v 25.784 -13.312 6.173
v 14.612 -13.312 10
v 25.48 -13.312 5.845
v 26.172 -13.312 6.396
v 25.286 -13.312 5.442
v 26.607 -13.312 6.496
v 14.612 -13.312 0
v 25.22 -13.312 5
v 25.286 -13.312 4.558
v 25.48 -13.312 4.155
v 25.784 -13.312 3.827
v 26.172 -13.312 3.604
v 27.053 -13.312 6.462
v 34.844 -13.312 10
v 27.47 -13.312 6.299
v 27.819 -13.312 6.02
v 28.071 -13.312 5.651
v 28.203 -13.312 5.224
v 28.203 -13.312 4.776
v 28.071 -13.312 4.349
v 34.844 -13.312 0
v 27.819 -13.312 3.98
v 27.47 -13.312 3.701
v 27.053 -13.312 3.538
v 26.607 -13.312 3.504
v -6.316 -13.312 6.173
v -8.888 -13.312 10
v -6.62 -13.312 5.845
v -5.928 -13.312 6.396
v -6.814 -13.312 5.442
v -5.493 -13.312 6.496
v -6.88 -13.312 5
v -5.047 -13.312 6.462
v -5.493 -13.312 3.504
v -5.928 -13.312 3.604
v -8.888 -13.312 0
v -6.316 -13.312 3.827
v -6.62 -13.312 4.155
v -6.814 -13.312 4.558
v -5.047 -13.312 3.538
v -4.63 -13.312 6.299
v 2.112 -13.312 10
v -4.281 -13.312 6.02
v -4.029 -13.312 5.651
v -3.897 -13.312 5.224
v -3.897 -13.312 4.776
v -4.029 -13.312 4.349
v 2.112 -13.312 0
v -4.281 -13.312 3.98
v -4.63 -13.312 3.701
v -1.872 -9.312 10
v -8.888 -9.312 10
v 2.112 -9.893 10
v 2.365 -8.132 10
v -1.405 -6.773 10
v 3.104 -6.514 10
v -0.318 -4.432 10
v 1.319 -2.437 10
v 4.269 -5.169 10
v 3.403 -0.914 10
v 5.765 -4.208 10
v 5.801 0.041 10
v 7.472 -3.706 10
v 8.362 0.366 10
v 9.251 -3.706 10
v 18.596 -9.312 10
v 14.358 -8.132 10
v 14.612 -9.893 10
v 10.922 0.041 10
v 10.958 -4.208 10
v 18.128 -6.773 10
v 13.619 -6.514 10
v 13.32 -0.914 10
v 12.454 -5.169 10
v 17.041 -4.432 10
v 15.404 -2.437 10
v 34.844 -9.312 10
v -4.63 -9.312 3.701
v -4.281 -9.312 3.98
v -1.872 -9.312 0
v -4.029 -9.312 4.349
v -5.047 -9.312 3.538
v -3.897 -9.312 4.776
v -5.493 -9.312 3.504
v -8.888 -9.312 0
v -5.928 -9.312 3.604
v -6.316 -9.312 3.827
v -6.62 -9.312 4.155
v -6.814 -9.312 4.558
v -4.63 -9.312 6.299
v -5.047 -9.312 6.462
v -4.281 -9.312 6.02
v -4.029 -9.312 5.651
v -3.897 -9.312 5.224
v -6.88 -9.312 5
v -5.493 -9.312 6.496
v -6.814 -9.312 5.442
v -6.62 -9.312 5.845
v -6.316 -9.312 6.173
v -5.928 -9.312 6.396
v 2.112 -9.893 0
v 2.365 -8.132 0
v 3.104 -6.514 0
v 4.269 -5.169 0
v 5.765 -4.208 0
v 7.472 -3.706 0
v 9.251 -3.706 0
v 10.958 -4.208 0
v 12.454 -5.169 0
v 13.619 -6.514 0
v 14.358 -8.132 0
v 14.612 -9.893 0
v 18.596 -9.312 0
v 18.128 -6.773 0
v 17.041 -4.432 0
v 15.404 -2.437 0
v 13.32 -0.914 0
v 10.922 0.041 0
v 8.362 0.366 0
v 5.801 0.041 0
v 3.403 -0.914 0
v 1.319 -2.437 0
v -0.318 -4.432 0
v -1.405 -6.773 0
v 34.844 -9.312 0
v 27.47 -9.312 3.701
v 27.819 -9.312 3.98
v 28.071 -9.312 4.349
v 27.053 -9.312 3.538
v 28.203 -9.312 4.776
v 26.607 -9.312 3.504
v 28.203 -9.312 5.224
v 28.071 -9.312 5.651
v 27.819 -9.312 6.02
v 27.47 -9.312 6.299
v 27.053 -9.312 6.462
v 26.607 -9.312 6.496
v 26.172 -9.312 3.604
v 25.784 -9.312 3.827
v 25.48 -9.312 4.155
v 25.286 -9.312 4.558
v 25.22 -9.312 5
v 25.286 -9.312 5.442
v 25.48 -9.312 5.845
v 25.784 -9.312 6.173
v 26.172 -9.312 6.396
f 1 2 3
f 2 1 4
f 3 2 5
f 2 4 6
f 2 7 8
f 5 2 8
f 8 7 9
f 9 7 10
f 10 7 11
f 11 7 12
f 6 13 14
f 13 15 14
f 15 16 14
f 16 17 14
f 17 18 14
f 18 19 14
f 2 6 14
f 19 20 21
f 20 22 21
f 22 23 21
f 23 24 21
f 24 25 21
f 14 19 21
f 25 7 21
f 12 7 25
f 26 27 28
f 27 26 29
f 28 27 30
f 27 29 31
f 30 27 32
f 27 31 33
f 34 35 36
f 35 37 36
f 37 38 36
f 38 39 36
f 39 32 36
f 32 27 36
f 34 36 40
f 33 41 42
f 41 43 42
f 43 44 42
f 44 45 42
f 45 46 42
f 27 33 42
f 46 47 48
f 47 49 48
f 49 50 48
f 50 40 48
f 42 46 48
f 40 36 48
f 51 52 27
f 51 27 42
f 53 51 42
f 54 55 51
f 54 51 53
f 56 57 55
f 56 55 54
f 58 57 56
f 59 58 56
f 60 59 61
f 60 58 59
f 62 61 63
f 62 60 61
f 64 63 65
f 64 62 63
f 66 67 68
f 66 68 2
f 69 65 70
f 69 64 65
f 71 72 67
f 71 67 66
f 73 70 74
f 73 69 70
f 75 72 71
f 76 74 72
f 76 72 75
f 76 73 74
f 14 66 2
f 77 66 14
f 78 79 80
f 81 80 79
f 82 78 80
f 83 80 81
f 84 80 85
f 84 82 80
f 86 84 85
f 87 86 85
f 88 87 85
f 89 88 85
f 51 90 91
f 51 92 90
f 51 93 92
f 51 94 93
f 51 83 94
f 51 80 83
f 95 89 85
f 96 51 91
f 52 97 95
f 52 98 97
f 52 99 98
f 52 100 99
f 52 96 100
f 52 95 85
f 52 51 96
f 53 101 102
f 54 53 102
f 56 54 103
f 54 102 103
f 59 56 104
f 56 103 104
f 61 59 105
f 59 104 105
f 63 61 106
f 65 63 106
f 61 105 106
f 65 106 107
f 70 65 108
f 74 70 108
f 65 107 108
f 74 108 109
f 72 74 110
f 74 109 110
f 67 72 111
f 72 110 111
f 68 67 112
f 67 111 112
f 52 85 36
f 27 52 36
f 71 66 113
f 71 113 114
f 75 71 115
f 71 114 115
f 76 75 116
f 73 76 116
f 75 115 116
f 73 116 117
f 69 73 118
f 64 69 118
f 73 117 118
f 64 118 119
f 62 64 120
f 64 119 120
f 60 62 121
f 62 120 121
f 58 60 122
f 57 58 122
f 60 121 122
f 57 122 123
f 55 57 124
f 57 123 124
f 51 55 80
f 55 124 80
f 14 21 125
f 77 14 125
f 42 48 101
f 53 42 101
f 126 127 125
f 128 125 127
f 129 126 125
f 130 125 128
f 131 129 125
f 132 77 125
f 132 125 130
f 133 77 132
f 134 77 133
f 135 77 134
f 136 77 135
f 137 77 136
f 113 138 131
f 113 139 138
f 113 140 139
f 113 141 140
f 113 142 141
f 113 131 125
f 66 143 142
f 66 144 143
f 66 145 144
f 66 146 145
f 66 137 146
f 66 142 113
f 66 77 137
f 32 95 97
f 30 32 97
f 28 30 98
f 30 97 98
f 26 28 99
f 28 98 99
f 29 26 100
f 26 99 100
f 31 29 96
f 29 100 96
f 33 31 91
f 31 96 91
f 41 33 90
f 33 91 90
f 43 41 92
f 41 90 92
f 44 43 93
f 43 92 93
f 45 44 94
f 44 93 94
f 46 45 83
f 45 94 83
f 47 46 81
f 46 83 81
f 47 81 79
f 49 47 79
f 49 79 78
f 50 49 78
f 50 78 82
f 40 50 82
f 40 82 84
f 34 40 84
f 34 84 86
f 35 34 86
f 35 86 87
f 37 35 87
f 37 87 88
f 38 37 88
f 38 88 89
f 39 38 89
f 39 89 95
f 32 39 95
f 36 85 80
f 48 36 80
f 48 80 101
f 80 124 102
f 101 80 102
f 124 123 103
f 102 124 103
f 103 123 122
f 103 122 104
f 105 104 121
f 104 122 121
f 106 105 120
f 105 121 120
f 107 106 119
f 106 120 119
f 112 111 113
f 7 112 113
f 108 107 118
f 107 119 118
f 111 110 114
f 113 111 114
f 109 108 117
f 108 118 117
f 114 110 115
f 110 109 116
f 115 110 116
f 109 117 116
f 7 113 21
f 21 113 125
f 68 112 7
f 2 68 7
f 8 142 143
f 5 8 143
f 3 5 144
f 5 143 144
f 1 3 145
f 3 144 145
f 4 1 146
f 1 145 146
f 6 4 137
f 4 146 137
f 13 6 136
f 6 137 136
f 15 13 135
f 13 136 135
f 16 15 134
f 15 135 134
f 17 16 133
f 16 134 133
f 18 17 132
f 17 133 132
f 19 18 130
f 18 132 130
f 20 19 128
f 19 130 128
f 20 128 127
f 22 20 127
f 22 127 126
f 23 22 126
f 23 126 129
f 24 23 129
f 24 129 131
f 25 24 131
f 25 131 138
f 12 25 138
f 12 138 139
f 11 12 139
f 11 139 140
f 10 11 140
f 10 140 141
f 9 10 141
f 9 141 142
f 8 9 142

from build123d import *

# Parameters (mm, degrees)
F1_DEPTH  = 10
F3_DEPTH  = 13.6785106988
F4_DEPTH  = 3.268
F6_DEPTH  = 4
F8_DEPTH  = 4
F9_R      = 1.5
F10_DEPTH = 4.001


# Not quite as in the source:
# - a feature names something its author has since deleted; it is built from what else it names


with BuildPart() as f1:
    # F0 (on Top) → F1 (new body)
    with BuildSketch(Plane.XY):
        with BuildLine():
            Line((14.6115271971, -9.8928403326), (14.6115271971, -13.3118403326))
            Line((14.6115271971, -13.3118403326), (38.1115271971, -13.3118403326))
            Line((38.1115271971, -13.3118403326), (38.1115271971, -9.3118403326))
            Line((38.1115271971, -9.3118403326), (18.5955271971, -9.3118403326))
            ThreePointArc((18.5955271971, -9.3118403326), (8.3615271971, 0.3656703662), (-1.8724728029, -9.3118403326))
            Line((-1.8724728029, -9.3118403326), (-8.8884728029, -9.3118403326))
            Line((-8.8884728029, -9.3118403326), (-8.8884728029, -13.3118403326))
            Line((-8.8884728029, -13.3118403326), (2.1115271971, -13.3118403326))
            Line((2.1115271971, -13.3118403326), (2.1115271971, -9.8928403326))
            ThreePointArc((2.1115271971, -9.8928403326), (8.3615271971, -3.6428403326), (14.6115271971, -9.8928403326))
        make_face()
    extrude(amount=F1_DEPTH)

    # F2 (on face) → F3 (cut, through all)
    with BuildSketch(Plane.XZ.offset(13.3118403326)):
        Polygon((-2.1564728029, 5), (-3.0224728029, 6.4999559994), (-4.7544728029, 6.4999559994), (-5.6204728029, 5), (-4.7544728029, 3.5000440006), (-3.0224728029, 3.5000440006), align=None)
        Polygon((29.9775271971, 6.4999559994), (28.2455271971, 6.4999559994), (27.3795271971, 5), (28.2455271971, 3.5000440006), (29.9775271971, 3.5000440006), (30.8435271971, 5), align=None)
    extrude(amount=-F3_DEPTH, mode=Mode.SUBTRACT)

    # F4 (cut): a face of the model
    f4_faces = [f1.faces().sort_by_distance(p)[0] for p in [
        (38.1115271971, -11.3118403326, 5),
    ]]
    extrude(f4_faces, amount=-F4_DEPTH, mode=Mode.SUBTRACT)

    # F5 (on face) → F6 (join, through all)
    with BuildSketch(Plane(origin=(0, -9.3118403326, 0), x_dir=(-1, 0, 0), z_dir=(0, 1, 0))):
        Polygon((4.7544728029, 3.5000440006), (5.6204728029, 5), (4.7544728029, 6.4999559994), (3.0224728029, 6.4999559994), (2.1564728029, 5), (3.0224728029, 3.5000440006), align=None)
    extrude(amount=-F6_DEPTH)

    # F7 (on face) → F8 (join, through all)
    with BuildSketch(Plane(origin=(0, -9.3118403326, 0), x_dir=(-1, 0, 0), z_dir=(0, 1, 0))):
        Polygon((-28.2455271971, 3.5000440006), (-27.3795271971, 5), (-28.2455271971, 6.4999559994), (-29.9775271971, 6.4999559994), (-30.8435271971, 5), (-29.9775271971, 3.5000440006), align=None)
    extrude(amount=-F8_DEPTH)

    # F9 (on face) → F10 (cut, through all)
    with BuildSketch(Plane(origin=(0, -9.3118403326, 0), x_dir=(-1, 0, 0), z_dir=(0, 1, 0))):
        with Locations((5.3804728029, 5)):
            Circle(F9_R)
        with Locations((-26.7195271971, 5)):
            Circle(F9_R)
    extrude(amount=-F10_DEPTH, mode=Mode.SUBTRACT)


solid = f1.part
